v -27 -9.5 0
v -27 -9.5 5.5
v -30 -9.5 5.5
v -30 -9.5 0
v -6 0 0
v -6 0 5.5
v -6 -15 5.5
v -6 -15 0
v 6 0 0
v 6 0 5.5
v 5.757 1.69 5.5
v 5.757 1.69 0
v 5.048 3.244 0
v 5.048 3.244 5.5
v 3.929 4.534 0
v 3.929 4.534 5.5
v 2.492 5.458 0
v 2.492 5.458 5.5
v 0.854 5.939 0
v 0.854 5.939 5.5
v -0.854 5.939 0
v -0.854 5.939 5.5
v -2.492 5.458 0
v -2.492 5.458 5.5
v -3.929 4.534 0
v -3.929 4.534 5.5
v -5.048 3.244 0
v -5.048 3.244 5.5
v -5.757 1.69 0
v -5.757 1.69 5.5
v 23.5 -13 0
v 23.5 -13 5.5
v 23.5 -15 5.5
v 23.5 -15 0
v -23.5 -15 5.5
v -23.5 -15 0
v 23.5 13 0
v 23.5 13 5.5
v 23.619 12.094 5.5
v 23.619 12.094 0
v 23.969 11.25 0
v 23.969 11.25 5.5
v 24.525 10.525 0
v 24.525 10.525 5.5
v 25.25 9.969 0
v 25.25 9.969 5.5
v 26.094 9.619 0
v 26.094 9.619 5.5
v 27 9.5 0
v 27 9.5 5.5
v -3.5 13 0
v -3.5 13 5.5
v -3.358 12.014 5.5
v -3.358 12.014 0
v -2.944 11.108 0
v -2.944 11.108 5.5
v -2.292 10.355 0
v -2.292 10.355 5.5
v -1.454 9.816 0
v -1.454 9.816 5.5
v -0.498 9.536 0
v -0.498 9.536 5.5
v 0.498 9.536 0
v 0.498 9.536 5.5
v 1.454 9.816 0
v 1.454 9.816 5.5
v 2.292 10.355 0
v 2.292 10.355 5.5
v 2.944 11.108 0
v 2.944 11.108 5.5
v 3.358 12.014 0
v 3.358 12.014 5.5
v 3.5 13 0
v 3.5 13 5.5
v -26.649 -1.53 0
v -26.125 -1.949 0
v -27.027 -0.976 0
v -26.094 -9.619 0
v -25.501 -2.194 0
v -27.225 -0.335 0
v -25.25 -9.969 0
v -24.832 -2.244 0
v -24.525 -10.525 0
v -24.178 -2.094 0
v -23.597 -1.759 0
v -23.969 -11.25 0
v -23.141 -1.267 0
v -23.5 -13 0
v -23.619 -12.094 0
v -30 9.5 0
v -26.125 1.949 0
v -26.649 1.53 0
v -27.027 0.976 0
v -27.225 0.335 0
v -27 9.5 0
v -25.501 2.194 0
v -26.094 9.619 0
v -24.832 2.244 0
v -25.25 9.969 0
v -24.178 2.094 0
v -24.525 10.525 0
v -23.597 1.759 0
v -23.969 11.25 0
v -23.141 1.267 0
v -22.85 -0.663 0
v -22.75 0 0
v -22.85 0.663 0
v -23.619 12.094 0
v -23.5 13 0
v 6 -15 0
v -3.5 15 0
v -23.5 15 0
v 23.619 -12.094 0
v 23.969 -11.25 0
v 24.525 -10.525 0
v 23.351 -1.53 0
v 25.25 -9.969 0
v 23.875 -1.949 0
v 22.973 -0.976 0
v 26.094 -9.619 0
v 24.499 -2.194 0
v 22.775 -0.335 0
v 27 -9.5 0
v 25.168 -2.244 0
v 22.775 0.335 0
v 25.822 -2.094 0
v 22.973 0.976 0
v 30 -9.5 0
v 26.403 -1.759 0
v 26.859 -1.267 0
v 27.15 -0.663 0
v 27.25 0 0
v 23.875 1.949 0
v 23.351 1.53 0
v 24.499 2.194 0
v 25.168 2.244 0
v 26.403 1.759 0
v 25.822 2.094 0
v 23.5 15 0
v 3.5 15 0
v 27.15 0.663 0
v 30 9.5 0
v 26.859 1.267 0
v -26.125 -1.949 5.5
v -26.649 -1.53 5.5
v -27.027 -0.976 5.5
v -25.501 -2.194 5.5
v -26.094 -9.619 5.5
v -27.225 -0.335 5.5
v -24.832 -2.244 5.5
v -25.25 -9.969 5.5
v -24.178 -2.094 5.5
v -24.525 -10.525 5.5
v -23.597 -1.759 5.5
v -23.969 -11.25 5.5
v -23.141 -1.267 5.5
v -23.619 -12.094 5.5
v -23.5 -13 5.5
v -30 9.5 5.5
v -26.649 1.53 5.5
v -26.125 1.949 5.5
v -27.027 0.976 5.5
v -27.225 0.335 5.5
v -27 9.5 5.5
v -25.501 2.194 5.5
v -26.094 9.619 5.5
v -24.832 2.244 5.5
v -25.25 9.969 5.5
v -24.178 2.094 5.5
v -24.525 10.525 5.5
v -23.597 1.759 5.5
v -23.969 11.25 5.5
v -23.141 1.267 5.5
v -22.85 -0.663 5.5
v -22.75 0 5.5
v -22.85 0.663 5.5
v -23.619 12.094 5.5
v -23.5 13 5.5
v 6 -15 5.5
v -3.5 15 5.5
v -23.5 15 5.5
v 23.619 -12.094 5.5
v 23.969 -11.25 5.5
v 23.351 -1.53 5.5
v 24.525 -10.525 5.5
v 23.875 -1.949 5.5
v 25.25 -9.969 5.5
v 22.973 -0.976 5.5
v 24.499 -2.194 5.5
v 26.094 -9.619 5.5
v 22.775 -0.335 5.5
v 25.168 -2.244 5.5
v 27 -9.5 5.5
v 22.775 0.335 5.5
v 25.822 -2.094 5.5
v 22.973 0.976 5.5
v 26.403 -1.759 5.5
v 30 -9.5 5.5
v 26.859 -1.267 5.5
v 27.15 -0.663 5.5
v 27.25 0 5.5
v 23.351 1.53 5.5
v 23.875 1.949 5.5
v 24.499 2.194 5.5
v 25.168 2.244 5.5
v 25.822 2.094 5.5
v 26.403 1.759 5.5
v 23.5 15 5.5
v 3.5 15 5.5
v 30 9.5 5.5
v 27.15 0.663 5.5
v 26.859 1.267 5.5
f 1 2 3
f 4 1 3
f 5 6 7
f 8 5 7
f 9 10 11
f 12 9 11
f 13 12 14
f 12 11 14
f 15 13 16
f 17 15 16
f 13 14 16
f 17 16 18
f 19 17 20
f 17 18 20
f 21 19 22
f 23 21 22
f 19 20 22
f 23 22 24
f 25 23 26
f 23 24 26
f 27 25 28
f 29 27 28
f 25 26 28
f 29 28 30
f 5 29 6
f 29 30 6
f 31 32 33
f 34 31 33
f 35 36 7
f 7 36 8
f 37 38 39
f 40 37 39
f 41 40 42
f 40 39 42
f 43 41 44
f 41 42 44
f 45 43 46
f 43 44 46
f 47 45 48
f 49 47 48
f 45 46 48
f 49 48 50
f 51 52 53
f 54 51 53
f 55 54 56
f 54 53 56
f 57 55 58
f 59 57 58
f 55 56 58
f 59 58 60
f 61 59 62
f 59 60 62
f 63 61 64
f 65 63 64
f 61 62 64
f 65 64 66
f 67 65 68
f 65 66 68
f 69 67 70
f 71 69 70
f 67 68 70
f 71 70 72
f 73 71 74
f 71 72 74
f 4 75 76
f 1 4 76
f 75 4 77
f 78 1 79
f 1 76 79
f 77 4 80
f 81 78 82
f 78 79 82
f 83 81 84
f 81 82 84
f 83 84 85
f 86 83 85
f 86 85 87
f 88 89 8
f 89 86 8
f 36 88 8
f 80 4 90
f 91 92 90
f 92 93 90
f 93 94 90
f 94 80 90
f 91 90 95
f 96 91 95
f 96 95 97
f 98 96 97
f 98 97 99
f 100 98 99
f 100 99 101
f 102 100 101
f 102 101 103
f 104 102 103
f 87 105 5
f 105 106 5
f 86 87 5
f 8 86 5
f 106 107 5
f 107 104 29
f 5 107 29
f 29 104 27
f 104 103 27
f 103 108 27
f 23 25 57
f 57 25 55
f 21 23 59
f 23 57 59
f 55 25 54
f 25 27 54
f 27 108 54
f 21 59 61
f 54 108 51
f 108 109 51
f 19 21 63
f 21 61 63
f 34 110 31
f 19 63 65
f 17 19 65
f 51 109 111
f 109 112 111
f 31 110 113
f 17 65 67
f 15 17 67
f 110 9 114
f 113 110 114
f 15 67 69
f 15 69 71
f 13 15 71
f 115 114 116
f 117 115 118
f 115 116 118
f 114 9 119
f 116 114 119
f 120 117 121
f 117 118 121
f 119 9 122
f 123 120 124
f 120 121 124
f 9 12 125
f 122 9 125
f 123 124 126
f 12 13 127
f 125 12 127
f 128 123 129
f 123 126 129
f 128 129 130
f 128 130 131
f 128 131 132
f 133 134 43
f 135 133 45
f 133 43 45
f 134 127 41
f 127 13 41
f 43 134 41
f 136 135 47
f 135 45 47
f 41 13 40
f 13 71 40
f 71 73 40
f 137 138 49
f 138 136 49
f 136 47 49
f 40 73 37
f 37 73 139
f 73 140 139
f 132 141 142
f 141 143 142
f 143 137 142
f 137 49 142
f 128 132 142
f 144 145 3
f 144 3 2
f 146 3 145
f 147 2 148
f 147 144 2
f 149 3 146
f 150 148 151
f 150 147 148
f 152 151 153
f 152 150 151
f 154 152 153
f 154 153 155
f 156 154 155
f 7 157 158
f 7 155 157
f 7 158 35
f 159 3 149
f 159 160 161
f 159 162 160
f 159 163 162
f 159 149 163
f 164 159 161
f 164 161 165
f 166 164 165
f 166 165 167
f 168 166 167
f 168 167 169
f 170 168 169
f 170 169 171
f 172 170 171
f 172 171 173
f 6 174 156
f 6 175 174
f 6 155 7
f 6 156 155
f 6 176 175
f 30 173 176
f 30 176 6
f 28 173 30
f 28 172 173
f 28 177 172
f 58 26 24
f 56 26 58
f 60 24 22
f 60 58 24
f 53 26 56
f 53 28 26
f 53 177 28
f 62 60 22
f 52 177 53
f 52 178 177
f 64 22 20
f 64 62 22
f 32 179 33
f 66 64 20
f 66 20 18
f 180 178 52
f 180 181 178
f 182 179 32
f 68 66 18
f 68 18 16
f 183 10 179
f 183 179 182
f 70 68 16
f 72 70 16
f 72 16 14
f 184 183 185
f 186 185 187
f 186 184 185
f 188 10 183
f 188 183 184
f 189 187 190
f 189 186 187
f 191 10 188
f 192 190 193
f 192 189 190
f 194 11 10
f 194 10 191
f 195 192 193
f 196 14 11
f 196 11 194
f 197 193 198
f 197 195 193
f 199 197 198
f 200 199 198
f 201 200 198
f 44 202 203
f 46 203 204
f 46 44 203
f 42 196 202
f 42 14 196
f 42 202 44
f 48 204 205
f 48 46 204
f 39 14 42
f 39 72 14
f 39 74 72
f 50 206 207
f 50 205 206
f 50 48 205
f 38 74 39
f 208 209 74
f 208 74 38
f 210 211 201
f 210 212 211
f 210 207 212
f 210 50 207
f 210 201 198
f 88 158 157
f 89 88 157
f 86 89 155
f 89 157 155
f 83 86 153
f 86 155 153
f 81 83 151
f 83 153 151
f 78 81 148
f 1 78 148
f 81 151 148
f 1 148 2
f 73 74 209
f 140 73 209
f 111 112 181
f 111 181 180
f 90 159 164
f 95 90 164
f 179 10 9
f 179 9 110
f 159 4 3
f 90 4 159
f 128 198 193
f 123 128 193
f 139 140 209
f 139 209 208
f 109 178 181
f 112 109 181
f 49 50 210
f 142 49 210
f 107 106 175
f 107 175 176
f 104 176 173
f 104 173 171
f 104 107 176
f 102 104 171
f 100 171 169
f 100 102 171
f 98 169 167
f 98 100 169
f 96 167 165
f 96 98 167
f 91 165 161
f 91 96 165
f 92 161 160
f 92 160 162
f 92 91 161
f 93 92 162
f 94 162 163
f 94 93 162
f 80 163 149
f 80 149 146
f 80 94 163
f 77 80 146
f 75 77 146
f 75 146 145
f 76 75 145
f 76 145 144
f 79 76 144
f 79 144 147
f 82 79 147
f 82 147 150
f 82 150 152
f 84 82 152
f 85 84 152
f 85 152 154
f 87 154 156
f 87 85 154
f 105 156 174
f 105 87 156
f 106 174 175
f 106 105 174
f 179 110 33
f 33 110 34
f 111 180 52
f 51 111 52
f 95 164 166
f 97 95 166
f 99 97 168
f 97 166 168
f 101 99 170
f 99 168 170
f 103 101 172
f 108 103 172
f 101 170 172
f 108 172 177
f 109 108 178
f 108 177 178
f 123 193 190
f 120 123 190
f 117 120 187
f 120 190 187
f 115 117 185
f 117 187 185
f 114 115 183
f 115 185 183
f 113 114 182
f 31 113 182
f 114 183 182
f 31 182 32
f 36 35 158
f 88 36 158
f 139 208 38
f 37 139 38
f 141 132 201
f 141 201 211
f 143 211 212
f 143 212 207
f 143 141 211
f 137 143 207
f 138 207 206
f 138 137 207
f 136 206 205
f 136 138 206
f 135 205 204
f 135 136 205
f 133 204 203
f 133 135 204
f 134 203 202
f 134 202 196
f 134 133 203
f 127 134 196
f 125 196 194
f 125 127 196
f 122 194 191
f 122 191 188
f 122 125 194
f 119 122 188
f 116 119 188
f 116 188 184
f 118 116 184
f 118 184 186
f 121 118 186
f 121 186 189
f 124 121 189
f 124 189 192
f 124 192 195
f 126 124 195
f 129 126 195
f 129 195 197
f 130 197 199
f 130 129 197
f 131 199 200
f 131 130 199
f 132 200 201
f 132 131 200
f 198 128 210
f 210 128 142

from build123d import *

# Parameters (mm, degrees)
SKETCH_W     = 60
SKETCH_H     = 30
SKETCH_R     = 2.25
SKETCH_R_2   = 2.05
PAD_DEPTH    = 5.5
SKETCH001_W  = 75
SKETCH001_H  = 45
POCKET_DEPTH = 5.501


with BuildPart() as part:
    # Sketch → Pad (new body)
    with BuildSketch(Plane.XY):
        Rectangle(SKETCH_W, SKETCH_H)
        with Locations((25, 0)):
            Circle(SKETCH_R, mode=Mode.SUBTRACT)
        with Locations((-25, 0)):
            Circle(SKETCH_R, mode=Mode.SUBTRACT)
        Circle(SKETCH_R_2, mode=Mode.SUBTRACT)
    extrude(amount=PAD_DEPTH)

    # Sketch001 → Pocket (cut, through all)
    with BuildSketch(Plane.XY.offset(5.5)):
        Rectangle(SKETCH001_W, SKETCH001_H)
        with BuildLine():
            ThreePointArc((-27, 9.5), (-24.525126, 10.525126), (-23.5, 13))
            Line((-23.5, 13), (-23.5, 18))
            Line((-23.5, 18), (-3.5, 18))
            Line((-3.5, 18), (-3.5, 13))
            ThreePointArc((-3.5, 13), (0, 9.5), (3.5, 13))
            Line((3.5, 13), (3.5, 18))
            Line((3.5, 18), (23.5, 18))
            Line((23.5, 18), (23.5, 13))
            ThreePointArc((23.5, 13), (24.525126, 10.525127), (26.999998, 9.5))
            Line((26.999998, 9.5), (31.999998, 9.5))
            Line((31.999998, 9.5), (31.999998, -9.5))
            Line((31.999998, -9.5), (26.999998, -9.5))
            ThreePointArc((26.999998, -9.5), (24.525126, -10.525127), (23.5, -13))
            Line((23.5, -13), (23.5, -18))
            Line((23.5, -18), (6, -18))
            Line((6, 0), (6, -18))
            ThreePointArc((6, 0), (0, 6), (-6, 0))
            Line((-6, 0), (-6, -18))
            Line((-23.5, -18), (-6, -18))
            Line((-23.5, -18), (-23.5, -13))
            ThreePointArc((-23.5, -13), (-24.525126, -10.525127), (-27, -9.5))
            Line((-27, -9.5), (-32, -9.5))
            Line((-32, -9.5), (-32, 9.5))
            Line((-32, 9.5), (-27, 9.5))
        make_face(mode=Mode.SUBTRACT)
    extrude(amount=-POCKET_DEPTH, mode=Mode.SUBTRACT)


solid = part.part
